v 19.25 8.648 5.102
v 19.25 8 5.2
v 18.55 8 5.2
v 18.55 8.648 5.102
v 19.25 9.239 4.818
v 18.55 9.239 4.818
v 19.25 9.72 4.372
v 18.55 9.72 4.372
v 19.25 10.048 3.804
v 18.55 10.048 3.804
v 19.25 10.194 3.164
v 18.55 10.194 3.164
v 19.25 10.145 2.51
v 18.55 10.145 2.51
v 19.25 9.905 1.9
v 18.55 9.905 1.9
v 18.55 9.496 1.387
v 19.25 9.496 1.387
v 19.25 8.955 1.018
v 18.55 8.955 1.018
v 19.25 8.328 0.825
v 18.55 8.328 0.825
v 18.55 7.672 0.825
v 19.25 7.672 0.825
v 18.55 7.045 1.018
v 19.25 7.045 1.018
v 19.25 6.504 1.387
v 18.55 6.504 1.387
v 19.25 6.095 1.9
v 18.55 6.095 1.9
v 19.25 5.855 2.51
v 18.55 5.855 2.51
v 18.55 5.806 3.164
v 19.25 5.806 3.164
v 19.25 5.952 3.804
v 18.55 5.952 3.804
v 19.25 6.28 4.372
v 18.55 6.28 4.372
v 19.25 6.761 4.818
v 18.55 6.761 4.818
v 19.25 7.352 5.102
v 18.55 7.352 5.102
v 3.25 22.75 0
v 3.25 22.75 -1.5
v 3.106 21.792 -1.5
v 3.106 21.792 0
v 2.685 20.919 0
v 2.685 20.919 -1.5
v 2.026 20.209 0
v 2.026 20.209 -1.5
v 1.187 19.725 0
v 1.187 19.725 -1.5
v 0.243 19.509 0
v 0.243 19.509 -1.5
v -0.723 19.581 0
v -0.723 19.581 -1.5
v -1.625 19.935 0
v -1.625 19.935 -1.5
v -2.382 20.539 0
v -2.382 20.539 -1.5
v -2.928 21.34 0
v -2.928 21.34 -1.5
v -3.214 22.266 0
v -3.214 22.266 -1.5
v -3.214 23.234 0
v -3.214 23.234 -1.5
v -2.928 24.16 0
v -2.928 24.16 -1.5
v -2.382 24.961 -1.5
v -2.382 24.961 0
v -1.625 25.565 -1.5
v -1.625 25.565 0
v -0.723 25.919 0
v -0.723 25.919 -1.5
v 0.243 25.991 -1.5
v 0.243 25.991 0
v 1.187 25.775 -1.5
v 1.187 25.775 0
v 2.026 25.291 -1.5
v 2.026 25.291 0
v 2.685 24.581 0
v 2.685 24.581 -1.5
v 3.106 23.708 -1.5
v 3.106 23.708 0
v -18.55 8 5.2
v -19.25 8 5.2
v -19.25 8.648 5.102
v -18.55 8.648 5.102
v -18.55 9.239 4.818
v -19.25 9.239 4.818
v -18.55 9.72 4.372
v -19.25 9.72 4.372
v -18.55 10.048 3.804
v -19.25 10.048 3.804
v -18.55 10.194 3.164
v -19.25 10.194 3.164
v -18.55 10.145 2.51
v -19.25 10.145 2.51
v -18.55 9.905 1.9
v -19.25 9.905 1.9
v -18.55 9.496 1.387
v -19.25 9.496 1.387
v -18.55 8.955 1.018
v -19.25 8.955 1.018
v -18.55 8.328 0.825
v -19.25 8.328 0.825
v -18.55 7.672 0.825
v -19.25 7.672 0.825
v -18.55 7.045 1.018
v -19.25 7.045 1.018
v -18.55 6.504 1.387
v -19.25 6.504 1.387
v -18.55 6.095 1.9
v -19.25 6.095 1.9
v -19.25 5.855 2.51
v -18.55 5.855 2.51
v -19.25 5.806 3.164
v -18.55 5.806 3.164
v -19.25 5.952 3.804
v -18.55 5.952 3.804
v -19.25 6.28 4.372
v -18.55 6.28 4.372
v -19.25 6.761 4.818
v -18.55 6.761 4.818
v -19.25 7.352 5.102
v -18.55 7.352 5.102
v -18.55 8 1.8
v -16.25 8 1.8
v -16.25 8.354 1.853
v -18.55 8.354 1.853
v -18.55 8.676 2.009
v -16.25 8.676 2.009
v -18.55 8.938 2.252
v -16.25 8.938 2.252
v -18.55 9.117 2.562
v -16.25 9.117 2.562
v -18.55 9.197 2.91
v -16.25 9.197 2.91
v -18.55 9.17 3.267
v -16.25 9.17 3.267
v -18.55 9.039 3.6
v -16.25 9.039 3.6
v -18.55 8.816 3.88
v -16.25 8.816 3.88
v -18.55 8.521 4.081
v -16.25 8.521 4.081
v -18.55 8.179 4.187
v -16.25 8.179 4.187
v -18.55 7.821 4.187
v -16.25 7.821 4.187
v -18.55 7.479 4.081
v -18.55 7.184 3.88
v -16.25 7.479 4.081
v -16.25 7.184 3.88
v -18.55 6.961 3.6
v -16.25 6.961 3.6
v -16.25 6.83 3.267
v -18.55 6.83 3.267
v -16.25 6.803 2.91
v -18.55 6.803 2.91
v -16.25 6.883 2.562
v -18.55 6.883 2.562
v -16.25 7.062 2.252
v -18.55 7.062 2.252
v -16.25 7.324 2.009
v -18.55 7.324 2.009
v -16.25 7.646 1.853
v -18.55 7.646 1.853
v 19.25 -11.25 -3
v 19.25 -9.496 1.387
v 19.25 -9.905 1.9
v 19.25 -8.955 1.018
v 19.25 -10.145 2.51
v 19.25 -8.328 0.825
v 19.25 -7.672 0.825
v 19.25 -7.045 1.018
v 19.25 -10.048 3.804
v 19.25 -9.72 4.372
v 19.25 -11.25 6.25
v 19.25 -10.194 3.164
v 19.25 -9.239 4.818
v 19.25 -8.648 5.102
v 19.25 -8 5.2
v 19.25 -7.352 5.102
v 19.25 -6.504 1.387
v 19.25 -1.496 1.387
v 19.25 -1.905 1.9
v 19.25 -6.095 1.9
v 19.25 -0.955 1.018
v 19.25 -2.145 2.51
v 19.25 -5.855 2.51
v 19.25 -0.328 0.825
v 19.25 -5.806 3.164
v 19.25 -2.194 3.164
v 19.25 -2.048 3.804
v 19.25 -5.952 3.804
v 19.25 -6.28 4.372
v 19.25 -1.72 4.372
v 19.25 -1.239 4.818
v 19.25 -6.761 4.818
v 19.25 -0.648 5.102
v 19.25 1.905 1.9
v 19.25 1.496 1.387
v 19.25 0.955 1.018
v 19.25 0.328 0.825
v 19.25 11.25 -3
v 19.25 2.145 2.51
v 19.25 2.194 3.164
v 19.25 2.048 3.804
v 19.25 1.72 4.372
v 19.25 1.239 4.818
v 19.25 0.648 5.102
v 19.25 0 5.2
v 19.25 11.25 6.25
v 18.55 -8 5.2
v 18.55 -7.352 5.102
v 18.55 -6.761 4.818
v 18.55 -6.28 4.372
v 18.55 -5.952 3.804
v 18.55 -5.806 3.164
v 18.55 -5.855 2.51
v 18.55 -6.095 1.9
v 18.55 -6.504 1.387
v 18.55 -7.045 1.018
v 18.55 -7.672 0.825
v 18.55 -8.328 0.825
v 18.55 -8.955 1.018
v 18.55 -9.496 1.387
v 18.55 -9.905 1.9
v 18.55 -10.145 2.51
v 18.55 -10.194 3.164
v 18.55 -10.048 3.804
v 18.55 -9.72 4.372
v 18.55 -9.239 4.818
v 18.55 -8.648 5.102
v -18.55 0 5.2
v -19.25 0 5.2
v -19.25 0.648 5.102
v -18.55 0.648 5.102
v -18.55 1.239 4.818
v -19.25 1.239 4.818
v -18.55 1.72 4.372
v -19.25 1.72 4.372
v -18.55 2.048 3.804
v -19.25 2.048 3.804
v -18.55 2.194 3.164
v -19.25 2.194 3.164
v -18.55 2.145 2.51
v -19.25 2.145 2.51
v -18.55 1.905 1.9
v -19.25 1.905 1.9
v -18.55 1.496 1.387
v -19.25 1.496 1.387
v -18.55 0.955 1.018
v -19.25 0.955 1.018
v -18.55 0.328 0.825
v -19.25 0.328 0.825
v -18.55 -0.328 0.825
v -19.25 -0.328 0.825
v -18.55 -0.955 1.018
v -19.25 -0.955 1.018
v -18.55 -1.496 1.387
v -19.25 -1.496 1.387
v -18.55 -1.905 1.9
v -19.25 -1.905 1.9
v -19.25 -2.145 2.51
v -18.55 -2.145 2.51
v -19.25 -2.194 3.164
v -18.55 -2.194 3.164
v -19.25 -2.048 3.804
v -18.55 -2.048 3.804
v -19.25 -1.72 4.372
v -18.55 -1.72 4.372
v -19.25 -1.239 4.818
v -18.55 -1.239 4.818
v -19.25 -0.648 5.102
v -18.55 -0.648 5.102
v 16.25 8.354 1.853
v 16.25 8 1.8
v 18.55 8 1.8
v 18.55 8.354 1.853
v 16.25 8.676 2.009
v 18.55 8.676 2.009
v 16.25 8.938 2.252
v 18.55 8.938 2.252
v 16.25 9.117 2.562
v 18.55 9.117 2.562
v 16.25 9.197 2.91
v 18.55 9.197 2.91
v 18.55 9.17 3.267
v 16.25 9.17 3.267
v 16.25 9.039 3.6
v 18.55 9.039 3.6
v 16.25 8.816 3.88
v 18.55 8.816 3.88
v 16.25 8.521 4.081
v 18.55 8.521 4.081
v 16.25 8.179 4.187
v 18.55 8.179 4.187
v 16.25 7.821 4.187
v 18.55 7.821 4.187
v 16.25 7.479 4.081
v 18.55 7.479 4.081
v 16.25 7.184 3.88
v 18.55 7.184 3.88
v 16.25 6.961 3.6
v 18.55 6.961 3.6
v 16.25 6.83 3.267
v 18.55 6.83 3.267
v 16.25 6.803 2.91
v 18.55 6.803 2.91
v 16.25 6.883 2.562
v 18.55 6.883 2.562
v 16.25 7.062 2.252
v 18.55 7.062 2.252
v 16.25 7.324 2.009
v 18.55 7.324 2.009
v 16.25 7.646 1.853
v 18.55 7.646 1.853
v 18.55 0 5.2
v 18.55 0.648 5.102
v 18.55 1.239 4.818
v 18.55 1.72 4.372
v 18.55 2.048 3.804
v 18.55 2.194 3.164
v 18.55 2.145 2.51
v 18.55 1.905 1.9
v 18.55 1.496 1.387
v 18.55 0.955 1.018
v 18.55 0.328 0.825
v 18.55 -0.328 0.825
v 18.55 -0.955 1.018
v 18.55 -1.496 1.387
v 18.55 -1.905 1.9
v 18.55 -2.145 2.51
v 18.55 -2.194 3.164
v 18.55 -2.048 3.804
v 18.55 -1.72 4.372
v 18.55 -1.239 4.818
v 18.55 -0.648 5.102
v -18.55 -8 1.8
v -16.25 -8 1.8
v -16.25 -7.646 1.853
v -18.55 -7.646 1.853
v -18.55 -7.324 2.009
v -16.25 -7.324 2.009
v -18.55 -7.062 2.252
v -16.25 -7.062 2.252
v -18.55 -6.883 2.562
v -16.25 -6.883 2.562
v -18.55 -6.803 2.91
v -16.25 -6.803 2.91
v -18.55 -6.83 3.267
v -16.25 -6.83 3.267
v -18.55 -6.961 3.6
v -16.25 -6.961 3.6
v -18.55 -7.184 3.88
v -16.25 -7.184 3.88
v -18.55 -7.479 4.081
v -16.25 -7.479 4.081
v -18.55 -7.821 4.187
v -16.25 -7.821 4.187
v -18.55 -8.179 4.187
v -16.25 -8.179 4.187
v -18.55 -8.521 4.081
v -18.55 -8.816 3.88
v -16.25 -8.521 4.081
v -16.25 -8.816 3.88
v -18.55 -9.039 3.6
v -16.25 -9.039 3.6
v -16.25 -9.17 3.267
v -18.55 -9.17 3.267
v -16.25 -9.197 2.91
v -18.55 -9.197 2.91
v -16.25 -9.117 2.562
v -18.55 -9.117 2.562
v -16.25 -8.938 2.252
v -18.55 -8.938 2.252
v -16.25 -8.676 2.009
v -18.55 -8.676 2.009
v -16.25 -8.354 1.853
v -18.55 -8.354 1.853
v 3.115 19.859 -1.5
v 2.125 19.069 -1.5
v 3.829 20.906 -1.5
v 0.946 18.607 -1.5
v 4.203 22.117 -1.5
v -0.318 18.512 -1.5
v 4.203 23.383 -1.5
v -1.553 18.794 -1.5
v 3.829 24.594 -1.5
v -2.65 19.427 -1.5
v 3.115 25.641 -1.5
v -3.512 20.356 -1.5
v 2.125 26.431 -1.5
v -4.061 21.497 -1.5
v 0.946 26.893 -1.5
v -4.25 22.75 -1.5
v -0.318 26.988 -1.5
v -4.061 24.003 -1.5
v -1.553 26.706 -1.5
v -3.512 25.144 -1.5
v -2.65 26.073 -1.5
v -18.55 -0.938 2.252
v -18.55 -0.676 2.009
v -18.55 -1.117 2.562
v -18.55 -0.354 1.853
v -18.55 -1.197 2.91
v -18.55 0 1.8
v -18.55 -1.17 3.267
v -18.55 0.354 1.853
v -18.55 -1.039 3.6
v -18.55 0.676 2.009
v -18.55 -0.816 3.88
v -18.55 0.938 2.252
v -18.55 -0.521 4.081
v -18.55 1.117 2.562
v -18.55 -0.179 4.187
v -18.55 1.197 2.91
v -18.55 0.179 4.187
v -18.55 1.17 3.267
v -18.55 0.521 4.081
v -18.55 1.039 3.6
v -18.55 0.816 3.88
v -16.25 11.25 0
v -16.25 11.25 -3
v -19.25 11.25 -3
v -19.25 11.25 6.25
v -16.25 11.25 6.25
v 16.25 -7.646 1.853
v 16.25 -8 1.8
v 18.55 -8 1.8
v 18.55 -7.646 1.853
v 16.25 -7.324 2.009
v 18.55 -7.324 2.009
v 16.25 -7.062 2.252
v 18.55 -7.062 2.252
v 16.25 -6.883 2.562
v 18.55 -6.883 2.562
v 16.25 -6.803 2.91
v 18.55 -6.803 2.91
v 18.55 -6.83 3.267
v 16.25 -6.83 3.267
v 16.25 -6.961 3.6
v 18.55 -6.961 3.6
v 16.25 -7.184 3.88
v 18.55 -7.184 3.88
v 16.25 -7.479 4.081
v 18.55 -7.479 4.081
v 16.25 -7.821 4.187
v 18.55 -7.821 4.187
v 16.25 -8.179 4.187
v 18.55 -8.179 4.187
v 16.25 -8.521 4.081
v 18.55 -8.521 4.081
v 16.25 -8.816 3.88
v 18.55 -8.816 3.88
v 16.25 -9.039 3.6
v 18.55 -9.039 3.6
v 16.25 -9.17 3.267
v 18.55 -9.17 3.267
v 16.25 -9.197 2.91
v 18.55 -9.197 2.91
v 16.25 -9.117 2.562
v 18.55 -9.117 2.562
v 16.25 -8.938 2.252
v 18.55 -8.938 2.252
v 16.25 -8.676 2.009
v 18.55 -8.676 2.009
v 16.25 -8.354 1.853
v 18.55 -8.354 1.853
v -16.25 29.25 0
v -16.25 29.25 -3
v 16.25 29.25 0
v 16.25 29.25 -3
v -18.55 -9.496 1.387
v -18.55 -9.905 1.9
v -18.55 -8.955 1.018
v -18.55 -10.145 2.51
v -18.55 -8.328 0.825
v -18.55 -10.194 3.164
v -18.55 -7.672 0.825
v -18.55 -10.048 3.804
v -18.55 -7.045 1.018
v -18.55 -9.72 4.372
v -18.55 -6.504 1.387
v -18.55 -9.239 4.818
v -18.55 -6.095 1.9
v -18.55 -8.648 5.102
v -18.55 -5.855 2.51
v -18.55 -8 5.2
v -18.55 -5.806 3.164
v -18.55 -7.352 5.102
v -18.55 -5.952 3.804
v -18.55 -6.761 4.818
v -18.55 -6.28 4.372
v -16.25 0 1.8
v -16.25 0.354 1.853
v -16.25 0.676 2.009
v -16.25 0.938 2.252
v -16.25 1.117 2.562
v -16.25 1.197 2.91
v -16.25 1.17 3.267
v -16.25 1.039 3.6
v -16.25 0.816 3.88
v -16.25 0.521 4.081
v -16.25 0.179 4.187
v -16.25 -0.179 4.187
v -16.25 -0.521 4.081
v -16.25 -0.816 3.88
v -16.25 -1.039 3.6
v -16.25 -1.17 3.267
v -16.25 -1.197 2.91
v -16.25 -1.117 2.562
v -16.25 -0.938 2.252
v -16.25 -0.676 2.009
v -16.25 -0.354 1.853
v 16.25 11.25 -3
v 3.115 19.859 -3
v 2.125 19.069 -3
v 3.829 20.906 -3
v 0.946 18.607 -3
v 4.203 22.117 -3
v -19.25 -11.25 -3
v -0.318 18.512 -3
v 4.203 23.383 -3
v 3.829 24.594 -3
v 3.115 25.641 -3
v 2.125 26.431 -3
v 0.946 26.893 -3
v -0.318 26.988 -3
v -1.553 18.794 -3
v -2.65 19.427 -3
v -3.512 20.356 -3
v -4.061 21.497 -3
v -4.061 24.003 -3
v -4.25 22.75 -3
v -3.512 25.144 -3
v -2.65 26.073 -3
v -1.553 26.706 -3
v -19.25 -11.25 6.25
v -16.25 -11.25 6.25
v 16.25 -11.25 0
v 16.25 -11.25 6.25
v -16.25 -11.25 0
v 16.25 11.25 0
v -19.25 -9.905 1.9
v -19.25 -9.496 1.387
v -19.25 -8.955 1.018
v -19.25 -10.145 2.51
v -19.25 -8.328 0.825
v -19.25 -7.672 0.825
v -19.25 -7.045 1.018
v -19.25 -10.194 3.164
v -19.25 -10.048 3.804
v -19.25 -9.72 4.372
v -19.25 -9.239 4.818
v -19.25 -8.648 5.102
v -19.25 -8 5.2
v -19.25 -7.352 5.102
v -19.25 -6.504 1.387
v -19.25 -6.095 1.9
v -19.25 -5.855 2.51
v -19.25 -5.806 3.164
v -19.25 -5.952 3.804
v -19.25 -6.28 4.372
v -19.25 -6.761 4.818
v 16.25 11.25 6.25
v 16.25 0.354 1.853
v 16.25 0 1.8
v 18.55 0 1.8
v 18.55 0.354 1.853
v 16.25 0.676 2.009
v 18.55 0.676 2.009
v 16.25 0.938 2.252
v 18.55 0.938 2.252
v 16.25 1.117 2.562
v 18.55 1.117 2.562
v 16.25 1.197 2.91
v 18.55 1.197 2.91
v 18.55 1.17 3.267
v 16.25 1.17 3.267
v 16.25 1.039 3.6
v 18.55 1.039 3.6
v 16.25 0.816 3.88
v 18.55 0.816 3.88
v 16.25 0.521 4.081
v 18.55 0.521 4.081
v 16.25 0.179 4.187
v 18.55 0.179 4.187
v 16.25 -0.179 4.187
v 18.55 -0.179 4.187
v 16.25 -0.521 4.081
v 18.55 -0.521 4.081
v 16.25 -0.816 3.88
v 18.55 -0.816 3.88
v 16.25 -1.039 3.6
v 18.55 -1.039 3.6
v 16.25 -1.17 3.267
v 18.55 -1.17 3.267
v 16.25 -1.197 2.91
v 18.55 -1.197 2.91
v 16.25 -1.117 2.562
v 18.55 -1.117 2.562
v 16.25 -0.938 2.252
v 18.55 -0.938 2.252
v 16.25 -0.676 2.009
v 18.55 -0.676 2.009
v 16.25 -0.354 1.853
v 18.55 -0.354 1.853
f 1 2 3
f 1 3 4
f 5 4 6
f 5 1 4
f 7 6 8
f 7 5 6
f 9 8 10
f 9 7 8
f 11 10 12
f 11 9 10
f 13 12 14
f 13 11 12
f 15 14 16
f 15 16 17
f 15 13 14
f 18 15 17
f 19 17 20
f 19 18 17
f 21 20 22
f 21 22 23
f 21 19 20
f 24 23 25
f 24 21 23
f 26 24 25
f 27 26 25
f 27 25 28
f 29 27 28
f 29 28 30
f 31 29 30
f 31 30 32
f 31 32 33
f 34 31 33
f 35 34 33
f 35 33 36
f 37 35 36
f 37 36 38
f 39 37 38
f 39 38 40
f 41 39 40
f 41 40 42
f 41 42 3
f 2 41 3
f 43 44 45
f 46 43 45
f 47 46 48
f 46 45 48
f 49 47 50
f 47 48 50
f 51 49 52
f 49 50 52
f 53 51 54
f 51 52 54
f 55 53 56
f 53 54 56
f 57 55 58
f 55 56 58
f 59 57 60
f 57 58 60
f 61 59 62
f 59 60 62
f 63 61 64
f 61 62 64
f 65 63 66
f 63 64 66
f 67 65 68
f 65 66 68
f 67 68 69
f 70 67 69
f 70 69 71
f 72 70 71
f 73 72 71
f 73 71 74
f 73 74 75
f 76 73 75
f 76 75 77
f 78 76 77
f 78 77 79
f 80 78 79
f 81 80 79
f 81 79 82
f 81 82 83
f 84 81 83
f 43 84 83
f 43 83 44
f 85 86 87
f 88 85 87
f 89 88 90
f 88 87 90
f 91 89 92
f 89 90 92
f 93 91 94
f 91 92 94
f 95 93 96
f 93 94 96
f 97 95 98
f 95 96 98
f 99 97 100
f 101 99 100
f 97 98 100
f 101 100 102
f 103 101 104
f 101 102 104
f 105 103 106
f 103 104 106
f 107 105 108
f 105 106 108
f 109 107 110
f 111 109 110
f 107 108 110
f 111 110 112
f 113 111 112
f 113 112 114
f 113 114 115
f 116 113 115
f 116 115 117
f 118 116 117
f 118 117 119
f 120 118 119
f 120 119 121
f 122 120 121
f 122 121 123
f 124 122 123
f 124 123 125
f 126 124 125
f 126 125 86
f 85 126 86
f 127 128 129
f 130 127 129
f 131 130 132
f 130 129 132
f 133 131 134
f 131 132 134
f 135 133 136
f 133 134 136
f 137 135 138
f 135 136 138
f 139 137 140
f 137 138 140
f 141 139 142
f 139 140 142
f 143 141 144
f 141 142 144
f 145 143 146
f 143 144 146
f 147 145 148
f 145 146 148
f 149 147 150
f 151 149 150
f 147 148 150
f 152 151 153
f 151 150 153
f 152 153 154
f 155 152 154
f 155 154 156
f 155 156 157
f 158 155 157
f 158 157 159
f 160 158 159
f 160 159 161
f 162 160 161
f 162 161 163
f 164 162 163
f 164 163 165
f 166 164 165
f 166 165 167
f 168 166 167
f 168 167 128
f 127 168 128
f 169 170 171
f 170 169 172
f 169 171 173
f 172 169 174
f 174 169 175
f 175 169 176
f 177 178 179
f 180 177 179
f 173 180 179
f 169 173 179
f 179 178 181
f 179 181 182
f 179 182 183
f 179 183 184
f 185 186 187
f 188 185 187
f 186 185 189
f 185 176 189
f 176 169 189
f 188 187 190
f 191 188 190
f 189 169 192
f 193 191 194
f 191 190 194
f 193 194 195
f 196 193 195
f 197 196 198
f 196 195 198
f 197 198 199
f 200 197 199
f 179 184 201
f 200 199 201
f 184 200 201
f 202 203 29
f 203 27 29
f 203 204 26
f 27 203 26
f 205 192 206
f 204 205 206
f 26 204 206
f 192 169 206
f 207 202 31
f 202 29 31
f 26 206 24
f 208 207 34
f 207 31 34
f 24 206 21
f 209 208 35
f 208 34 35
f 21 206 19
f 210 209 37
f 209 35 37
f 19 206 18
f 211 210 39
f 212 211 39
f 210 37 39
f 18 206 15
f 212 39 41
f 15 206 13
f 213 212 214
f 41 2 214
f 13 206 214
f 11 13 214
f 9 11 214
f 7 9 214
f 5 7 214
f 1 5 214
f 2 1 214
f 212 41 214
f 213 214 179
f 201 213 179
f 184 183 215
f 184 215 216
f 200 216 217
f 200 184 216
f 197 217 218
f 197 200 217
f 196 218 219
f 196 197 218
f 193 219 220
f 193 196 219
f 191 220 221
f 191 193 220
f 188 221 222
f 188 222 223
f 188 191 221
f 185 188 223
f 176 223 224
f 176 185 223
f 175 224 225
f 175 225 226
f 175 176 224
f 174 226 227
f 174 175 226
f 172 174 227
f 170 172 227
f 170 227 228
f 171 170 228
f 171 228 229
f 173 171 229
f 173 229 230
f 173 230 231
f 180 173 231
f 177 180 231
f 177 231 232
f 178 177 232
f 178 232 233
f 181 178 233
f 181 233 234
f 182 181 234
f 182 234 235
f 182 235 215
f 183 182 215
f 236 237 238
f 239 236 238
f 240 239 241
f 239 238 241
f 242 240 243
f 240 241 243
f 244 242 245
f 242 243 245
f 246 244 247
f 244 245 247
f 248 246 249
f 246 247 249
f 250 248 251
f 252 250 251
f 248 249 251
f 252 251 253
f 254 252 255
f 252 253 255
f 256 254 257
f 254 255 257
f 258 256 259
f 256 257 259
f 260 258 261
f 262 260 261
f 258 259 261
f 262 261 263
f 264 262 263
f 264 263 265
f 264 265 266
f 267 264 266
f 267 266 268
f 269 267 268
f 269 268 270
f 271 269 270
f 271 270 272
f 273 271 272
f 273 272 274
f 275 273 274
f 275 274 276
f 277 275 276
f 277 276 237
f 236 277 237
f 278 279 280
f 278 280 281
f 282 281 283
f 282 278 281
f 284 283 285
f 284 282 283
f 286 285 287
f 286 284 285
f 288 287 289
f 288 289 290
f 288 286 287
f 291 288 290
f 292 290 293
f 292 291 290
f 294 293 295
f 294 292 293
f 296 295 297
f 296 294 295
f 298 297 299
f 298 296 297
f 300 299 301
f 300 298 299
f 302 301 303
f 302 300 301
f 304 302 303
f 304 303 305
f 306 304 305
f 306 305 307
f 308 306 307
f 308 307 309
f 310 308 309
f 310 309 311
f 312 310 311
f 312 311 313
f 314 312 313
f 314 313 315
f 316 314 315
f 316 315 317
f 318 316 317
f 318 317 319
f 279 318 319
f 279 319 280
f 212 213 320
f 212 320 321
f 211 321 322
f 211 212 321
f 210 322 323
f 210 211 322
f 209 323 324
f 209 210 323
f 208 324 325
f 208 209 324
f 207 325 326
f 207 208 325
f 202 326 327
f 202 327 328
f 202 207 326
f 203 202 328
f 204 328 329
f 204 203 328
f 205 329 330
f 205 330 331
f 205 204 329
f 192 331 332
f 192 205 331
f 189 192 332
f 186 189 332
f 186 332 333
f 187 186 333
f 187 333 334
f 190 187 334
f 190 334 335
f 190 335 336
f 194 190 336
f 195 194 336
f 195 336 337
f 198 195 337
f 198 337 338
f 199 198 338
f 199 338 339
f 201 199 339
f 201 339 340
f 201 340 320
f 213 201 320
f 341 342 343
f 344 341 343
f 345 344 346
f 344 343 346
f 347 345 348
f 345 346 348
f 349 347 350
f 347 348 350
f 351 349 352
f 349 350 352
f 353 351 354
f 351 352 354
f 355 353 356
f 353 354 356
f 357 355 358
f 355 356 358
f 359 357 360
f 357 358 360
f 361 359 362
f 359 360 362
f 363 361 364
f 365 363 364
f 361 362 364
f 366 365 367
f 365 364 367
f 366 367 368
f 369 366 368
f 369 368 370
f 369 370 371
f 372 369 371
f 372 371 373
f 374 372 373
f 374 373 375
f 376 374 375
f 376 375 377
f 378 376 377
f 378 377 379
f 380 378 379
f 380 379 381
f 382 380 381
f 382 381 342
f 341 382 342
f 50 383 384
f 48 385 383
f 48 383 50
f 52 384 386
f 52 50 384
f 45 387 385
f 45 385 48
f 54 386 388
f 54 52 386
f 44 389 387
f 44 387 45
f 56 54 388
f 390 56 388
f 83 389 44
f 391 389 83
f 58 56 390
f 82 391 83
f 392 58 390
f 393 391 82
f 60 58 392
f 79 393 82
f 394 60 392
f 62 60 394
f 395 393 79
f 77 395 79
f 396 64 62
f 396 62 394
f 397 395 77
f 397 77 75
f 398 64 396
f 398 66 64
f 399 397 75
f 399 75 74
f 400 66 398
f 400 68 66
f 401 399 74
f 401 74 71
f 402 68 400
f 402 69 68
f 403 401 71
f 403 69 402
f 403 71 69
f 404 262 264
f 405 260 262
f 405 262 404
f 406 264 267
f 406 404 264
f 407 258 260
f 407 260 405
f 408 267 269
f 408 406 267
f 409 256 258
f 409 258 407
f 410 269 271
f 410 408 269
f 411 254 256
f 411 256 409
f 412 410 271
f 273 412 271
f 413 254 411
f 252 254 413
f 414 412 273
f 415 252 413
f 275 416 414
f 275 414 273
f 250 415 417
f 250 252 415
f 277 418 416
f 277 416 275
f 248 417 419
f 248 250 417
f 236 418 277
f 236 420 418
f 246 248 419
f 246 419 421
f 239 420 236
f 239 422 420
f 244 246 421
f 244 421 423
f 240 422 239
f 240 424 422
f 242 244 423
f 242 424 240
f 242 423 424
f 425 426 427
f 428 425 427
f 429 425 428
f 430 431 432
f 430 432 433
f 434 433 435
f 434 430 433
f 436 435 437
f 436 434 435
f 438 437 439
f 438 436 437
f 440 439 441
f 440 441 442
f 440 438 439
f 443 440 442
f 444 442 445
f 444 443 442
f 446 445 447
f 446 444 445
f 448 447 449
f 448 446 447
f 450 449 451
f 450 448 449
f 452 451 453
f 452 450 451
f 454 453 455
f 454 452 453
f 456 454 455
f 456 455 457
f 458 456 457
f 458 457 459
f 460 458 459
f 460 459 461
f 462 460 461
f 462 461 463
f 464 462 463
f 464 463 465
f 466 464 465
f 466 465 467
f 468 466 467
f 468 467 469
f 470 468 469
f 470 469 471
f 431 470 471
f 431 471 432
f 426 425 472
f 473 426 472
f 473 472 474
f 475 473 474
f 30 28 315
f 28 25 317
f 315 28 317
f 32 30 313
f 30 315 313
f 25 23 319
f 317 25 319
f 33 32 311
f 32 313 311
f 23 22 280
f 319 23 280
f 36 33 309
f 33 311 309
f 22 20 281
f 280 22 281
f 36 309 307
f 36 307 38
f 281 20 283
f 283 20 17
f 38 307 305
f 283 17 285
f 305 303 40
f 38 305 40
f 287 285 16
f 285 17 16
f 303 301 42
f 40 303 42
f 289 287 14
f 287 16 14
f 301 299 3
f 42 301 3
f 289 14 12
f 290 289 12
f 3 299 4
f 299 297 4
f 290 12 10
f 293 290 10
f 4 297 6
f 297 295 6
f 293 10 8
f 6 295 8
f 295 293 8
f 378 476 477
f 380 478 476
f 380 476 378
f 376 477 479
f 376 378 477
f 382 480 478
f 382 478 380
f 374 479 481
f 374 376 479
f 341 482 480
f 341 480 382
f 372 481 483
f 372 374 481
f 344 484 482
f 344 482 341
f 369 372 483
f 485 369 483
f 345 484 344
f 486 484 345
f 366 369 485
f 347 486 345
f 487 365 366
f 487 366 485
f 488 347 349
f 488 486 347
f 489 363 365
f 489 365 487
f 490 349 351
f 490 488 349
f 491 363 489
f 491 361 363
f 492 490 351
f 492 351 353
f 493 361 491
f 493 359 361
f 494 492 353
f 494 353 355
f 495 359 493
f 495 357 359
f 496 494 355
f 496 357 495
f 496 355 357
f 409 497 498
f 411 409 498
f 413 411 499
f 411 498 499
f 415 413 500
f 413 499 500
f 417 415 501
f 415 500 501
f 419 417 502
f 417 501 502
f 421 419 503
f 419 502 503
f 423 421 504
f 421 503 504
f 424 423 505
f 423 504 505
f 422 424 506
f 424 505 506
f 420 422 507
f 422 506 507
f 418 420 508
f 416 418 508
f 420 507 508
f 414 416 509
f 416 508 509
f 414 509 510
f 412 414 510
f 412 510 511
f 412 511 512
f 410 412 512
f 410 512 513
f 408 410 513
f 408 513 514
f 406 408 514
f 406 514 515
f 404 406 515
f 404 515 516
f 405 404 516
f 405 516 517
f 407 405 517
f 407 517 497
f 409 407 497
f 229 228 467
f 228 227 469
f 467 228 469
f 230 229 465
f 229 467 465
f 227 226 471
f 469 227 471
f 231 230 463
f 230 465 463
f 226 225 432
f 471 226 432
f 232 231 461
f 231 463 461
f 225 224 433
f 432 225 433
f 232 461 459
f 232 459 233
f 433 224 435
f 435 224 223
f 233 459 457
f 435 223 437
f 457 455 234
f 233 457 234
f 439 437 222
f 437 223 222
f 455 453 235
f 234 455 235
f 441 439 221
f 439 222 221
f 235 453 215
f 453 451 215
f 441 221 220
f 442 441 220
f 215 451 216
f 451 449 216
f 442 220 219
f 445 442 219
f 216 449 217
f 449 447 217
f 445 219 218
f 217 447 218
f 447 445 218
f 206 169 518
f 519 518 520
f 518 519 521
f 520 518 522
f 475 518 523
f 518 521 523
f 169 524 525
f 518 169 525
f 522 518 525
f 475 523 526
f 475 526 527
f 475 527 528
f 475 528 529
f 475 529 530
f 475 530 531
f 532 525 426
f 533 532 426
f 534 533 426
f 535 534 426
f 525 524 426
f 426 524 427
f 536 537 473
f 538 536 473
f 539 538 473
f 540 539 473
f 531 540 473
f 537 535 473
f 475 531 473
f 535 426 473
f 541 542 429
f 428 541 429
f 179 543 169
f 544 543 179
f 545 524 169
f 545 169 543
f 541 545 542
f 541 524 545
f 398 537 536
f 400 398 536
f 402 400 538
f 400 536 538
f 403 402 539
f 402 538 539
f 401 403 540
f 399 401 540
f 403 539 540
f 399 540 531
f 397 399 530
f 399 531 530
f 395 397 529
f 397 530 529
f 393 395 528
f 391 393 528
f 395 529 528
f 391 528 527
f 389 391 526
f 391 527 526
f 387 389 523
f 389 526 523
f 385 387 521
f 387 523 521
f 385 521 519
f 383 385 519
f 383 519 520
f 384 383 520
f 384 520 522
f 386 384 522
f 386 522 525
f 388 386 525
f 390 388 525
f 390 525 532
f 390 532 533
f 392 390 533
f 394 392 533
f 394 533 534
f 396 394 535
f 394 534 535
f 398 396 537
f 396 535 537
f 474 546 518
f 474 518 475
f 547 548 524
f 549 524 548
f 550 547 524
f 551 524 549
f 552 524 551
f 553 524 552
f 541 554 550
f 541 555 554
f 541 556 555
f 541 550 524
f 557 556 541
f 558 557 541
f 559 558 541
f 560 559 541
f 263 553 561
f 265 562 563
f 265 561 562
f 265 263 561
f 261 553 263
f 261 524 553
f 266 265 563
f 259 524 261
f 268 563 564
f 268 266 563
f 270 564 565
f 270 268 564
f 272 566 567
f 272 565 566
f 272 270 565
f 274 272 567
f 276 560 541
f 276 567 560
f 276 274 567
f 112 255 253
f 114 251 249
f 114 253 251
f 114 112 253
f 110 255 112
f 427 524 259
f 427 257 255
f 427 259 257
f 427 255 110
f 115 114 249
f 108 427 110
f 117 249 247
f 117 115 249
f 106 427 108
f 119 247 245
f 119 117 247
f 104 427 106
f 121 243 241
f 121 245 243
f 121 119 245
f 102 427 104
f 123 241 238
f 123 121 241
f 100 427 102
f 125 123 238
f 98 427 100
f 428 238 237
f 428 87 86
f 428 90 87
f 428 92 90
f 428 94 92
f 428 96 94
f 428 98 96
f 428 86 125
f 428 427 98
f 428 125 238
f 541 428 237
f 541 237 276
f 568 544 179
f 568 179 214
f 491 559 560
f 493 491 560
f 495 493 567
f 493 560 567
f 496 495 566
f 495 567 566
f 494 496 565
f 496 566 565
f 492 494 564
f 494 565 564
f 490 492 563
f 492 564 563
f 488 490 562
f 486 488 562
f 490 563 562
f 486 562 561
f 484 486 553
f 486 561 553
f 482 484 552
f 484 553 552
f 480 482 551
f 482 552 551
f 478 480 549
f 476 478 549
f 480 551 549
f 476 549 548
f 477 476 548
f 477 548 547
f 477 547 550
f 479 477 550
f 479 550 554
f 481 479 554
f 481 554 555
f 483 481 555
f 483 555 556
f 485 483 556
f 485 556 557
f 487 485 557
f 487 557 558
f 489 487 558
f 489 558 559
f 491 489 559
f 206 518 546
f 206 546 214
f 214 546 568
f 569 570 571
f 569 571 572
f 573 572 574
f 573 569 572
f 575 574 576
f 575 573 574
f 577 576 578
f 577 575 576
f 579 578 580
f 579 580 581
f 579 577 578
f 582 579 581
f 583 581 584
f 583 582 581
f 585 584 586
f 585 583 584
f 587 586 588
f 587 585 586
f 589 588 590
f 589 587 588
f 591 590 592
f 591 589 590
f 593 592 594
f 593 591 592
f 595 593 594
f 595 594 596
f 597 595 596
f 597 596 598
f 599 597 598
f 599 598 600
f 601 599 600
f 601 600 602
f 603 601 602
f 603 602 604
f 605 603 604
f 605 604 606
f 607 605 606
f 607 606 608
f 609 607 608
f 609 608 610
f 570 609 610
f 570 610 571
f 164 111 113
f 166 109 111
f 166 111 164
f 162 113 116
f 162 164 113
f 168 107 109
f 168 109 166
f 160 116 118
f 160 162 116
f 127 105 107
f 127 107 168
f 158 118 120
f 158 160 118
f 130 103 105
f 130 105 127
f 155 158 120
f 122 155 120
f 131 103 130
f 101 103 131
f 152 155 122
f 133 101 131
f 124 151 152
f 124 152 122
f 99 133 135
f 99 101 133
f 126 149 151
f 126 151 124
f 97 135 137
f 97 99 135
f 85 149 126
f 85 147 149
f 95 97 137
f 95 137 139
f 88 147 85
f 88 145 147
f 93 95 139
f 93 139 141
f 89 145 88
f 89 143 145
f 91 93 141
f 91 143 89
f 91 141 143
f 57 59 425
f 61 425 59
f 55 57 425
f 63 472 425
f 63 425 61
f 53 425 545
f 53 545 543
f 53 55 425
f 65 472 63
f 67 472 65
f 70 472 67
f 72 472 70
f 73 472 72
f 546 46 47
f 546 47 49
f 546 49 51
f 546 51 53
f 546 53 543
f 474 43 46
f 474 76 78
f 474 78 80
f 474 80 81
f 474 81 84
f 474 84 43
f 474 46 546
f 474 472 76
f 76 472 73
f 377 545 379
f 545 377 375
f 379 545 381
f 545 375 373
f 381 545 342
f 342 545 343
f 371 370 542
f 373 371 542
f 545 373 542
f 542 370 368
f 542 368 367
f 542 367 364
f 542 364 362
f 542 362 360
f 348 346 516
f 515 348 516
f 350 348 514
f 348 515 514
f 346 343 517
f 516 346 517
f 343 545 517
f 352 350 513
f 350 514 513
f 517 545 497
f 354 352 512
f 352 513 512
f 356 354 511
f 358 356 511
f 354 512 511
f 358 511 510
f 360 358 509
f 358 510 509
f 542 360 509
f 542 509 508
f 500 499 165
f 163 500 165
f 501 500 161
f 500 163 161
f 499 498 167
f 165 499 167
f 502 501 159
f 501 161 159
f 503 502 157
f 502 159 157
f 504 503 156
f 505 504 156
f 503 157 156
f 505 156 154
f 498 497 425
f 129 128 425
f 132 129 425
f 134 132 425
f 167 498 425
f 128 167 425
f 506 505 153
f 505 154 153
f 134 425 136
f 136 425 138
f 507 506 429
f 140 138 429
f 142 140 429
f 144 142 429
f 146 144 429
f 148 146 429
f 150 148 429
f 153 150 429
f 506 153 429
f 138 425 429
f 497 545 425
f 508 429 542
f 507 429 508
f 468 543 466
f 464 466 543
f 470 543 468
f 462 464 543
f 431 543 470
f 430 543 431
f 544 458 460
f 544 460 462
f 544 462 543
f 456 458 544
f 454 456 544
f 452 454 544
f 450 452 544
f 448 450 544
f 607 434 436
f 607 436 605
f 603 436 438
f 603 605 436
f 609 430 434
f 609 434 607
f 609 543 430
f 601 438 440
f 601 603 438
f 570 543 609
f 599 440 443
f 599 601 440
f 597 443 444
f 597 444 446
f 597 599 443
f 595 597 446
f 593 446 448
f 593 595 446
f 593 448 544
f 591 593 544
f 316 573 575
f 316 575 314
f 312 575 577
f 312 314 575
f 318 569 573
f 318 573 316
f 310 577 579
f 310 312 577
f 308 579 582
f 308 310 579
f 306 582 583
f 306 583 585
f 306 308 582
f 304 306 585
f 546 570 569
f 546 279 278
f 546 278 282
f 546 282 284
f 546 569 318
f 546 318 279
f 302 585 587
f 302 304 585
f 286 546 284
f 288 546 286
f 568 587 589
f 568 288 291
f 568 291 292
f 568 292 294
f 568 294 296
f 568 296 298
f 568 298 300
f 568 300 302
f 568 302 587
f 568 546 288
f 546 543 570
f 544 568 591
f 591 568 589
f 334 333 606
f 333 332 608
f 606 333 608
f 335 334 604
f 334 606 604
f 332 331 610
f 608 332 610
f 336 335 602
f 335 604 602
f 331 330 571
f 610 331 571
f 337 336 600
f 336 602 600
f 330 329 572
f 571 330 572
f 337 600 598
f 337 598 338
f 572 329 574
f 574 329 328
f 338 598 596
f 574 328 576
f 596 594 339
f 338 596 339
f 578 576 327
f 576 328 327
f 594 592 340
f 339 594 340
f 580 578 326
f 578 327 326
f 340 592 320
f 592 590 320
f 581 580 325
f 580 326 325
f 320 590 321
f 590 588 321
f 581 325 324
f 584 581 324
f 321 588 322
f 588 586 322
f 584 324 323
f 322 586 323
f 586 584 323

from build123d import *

# Parameters (mm, degrees)
ESBO_O1_W                                            = 32.5
ESBO_O1_H                                            = 40.5
RESSALTO_EXTRUS_O1_DEPTH                             = 3
ESBO_O4_W                                            = 9.25
ESBO_O4_H                                            = 22.5
RESSALTO_EXTRUS_O2_DEPTH                             = 3
ESBO_O5_R                                            = 4.25
CORTE_EXTRUS_O1_DEPTH                                = 1.5
ESBO_O6_R                                            = 3.25
CORTE_EXTRUS_O2_DEPTH                                = 37.217226564
REBAIXO_PARA_PARAFUSO_COM_CABE_A_REDONDA_D           = 2.4
REBAIXO_PARA_PARAFUSO_COM_CABE_A_REDONDA_DEPTH       = 3
REBAIXO_PARA_PARAFUSO_COM_CABE_A_REDONDA_CBORE_D     = 4.4
REBAIXO_PARA_PARAFUSO_COM_CABE_A_REDONDA_CBORE_DEPTH = 0.7


with BuildPart() as part:
    # Esboço1 → Ressalto-extrusão1 (new body)
    with BuildSketch(Plane.XY):
        with Locations((0, 9)):
            Rectangle(ESBO_O1_W, ESBO_O1_H)
    extrude(amount=-RESSALTO_EXTRUS_O1_DEPTH)

    # Esboço4 → Ressalto-extrusão2 (add)
    with BuildSketch(Plane.ZY.offset(16.25)):
        with Locations((1.625, 0)):
            Rectangle(ESBO_O4_W, ESBO_O4_H)
    ressalto_extrus_o2 = extrude(amount=RESSALTO_EXTRUS_O2_DEPTH)

    # Espelhar1: Ressalto-extrusão2 across plane
    add(ressalto_extrus_o2.mirror(Plane(origin=(0, 0, 0), x_dir=(0, 0, 1), z_dir=(1, 0, 0))))

    # Esboço5 → Corte-extrusão1 (cut)
    with BuildSketch(Plane(origin=(0, 0, -3), x_dir=(-1, 0, 0), z_dir=(0, 0, -1))):
        with Locations((0, 22.75)):
            Circle(ESBO_O5_R)
    extrude(amount=-CORTE_EXTRUS_O1_DEPTH, mode=Mode.SUBTRACT)

    # Esboço6 → Corte-extrusão2 (cut, through all)
    with BuildSketch(Plane(origin=(0, 0, -3), x_dir=(-1, 0, 0), z_dir=(0, 0, -1))):
        with Locations(Location((0, 22.75, 0), (0, 0, 180))):
            Circle(ESBO_O6_R)
    extrude(amount=-CORTE_EXTRUS_O2_DEPTH, mode=Mode.SUBTRACT)

    # Rebaixo para parafuso com cabeça redonda de M21
    with Locations(Plane.ZY.offset(19.25)):
        with Locations((3, 8), (3, 0), (3, -8)):
            rebaixo_para_parafuso_com_cabe_a_redonda = CounterBoreHole(REBAIXO_PARA_PARAFUSO_COM_CABE_A_REDONDA_D / 2, REBAIXO_PARA_PARAFUSO_COM_CABE_A_REDONDA_CBORE_D / 2, REBAIXO_PARA_PARAFUSO_COM_CABE_A_REDONDA_CBORE_DEPTH, depth=REBAIXO_PARA_PARAFUSO_COM_CABE_A_REDONDA_DEPTH)

    # Espelhar3: Rebaixo para parafuso com cabeça redonda de M21 across plane
    add(rebaixo_para_parafuso_com_cabe_a_redonda.mirror(Plane(origin=(0, 0, 0), x_dir=(0, 0, 1), z_dir=(1, 0, 0))), mode=Mode.SUBTRACT)


solid = part.part
